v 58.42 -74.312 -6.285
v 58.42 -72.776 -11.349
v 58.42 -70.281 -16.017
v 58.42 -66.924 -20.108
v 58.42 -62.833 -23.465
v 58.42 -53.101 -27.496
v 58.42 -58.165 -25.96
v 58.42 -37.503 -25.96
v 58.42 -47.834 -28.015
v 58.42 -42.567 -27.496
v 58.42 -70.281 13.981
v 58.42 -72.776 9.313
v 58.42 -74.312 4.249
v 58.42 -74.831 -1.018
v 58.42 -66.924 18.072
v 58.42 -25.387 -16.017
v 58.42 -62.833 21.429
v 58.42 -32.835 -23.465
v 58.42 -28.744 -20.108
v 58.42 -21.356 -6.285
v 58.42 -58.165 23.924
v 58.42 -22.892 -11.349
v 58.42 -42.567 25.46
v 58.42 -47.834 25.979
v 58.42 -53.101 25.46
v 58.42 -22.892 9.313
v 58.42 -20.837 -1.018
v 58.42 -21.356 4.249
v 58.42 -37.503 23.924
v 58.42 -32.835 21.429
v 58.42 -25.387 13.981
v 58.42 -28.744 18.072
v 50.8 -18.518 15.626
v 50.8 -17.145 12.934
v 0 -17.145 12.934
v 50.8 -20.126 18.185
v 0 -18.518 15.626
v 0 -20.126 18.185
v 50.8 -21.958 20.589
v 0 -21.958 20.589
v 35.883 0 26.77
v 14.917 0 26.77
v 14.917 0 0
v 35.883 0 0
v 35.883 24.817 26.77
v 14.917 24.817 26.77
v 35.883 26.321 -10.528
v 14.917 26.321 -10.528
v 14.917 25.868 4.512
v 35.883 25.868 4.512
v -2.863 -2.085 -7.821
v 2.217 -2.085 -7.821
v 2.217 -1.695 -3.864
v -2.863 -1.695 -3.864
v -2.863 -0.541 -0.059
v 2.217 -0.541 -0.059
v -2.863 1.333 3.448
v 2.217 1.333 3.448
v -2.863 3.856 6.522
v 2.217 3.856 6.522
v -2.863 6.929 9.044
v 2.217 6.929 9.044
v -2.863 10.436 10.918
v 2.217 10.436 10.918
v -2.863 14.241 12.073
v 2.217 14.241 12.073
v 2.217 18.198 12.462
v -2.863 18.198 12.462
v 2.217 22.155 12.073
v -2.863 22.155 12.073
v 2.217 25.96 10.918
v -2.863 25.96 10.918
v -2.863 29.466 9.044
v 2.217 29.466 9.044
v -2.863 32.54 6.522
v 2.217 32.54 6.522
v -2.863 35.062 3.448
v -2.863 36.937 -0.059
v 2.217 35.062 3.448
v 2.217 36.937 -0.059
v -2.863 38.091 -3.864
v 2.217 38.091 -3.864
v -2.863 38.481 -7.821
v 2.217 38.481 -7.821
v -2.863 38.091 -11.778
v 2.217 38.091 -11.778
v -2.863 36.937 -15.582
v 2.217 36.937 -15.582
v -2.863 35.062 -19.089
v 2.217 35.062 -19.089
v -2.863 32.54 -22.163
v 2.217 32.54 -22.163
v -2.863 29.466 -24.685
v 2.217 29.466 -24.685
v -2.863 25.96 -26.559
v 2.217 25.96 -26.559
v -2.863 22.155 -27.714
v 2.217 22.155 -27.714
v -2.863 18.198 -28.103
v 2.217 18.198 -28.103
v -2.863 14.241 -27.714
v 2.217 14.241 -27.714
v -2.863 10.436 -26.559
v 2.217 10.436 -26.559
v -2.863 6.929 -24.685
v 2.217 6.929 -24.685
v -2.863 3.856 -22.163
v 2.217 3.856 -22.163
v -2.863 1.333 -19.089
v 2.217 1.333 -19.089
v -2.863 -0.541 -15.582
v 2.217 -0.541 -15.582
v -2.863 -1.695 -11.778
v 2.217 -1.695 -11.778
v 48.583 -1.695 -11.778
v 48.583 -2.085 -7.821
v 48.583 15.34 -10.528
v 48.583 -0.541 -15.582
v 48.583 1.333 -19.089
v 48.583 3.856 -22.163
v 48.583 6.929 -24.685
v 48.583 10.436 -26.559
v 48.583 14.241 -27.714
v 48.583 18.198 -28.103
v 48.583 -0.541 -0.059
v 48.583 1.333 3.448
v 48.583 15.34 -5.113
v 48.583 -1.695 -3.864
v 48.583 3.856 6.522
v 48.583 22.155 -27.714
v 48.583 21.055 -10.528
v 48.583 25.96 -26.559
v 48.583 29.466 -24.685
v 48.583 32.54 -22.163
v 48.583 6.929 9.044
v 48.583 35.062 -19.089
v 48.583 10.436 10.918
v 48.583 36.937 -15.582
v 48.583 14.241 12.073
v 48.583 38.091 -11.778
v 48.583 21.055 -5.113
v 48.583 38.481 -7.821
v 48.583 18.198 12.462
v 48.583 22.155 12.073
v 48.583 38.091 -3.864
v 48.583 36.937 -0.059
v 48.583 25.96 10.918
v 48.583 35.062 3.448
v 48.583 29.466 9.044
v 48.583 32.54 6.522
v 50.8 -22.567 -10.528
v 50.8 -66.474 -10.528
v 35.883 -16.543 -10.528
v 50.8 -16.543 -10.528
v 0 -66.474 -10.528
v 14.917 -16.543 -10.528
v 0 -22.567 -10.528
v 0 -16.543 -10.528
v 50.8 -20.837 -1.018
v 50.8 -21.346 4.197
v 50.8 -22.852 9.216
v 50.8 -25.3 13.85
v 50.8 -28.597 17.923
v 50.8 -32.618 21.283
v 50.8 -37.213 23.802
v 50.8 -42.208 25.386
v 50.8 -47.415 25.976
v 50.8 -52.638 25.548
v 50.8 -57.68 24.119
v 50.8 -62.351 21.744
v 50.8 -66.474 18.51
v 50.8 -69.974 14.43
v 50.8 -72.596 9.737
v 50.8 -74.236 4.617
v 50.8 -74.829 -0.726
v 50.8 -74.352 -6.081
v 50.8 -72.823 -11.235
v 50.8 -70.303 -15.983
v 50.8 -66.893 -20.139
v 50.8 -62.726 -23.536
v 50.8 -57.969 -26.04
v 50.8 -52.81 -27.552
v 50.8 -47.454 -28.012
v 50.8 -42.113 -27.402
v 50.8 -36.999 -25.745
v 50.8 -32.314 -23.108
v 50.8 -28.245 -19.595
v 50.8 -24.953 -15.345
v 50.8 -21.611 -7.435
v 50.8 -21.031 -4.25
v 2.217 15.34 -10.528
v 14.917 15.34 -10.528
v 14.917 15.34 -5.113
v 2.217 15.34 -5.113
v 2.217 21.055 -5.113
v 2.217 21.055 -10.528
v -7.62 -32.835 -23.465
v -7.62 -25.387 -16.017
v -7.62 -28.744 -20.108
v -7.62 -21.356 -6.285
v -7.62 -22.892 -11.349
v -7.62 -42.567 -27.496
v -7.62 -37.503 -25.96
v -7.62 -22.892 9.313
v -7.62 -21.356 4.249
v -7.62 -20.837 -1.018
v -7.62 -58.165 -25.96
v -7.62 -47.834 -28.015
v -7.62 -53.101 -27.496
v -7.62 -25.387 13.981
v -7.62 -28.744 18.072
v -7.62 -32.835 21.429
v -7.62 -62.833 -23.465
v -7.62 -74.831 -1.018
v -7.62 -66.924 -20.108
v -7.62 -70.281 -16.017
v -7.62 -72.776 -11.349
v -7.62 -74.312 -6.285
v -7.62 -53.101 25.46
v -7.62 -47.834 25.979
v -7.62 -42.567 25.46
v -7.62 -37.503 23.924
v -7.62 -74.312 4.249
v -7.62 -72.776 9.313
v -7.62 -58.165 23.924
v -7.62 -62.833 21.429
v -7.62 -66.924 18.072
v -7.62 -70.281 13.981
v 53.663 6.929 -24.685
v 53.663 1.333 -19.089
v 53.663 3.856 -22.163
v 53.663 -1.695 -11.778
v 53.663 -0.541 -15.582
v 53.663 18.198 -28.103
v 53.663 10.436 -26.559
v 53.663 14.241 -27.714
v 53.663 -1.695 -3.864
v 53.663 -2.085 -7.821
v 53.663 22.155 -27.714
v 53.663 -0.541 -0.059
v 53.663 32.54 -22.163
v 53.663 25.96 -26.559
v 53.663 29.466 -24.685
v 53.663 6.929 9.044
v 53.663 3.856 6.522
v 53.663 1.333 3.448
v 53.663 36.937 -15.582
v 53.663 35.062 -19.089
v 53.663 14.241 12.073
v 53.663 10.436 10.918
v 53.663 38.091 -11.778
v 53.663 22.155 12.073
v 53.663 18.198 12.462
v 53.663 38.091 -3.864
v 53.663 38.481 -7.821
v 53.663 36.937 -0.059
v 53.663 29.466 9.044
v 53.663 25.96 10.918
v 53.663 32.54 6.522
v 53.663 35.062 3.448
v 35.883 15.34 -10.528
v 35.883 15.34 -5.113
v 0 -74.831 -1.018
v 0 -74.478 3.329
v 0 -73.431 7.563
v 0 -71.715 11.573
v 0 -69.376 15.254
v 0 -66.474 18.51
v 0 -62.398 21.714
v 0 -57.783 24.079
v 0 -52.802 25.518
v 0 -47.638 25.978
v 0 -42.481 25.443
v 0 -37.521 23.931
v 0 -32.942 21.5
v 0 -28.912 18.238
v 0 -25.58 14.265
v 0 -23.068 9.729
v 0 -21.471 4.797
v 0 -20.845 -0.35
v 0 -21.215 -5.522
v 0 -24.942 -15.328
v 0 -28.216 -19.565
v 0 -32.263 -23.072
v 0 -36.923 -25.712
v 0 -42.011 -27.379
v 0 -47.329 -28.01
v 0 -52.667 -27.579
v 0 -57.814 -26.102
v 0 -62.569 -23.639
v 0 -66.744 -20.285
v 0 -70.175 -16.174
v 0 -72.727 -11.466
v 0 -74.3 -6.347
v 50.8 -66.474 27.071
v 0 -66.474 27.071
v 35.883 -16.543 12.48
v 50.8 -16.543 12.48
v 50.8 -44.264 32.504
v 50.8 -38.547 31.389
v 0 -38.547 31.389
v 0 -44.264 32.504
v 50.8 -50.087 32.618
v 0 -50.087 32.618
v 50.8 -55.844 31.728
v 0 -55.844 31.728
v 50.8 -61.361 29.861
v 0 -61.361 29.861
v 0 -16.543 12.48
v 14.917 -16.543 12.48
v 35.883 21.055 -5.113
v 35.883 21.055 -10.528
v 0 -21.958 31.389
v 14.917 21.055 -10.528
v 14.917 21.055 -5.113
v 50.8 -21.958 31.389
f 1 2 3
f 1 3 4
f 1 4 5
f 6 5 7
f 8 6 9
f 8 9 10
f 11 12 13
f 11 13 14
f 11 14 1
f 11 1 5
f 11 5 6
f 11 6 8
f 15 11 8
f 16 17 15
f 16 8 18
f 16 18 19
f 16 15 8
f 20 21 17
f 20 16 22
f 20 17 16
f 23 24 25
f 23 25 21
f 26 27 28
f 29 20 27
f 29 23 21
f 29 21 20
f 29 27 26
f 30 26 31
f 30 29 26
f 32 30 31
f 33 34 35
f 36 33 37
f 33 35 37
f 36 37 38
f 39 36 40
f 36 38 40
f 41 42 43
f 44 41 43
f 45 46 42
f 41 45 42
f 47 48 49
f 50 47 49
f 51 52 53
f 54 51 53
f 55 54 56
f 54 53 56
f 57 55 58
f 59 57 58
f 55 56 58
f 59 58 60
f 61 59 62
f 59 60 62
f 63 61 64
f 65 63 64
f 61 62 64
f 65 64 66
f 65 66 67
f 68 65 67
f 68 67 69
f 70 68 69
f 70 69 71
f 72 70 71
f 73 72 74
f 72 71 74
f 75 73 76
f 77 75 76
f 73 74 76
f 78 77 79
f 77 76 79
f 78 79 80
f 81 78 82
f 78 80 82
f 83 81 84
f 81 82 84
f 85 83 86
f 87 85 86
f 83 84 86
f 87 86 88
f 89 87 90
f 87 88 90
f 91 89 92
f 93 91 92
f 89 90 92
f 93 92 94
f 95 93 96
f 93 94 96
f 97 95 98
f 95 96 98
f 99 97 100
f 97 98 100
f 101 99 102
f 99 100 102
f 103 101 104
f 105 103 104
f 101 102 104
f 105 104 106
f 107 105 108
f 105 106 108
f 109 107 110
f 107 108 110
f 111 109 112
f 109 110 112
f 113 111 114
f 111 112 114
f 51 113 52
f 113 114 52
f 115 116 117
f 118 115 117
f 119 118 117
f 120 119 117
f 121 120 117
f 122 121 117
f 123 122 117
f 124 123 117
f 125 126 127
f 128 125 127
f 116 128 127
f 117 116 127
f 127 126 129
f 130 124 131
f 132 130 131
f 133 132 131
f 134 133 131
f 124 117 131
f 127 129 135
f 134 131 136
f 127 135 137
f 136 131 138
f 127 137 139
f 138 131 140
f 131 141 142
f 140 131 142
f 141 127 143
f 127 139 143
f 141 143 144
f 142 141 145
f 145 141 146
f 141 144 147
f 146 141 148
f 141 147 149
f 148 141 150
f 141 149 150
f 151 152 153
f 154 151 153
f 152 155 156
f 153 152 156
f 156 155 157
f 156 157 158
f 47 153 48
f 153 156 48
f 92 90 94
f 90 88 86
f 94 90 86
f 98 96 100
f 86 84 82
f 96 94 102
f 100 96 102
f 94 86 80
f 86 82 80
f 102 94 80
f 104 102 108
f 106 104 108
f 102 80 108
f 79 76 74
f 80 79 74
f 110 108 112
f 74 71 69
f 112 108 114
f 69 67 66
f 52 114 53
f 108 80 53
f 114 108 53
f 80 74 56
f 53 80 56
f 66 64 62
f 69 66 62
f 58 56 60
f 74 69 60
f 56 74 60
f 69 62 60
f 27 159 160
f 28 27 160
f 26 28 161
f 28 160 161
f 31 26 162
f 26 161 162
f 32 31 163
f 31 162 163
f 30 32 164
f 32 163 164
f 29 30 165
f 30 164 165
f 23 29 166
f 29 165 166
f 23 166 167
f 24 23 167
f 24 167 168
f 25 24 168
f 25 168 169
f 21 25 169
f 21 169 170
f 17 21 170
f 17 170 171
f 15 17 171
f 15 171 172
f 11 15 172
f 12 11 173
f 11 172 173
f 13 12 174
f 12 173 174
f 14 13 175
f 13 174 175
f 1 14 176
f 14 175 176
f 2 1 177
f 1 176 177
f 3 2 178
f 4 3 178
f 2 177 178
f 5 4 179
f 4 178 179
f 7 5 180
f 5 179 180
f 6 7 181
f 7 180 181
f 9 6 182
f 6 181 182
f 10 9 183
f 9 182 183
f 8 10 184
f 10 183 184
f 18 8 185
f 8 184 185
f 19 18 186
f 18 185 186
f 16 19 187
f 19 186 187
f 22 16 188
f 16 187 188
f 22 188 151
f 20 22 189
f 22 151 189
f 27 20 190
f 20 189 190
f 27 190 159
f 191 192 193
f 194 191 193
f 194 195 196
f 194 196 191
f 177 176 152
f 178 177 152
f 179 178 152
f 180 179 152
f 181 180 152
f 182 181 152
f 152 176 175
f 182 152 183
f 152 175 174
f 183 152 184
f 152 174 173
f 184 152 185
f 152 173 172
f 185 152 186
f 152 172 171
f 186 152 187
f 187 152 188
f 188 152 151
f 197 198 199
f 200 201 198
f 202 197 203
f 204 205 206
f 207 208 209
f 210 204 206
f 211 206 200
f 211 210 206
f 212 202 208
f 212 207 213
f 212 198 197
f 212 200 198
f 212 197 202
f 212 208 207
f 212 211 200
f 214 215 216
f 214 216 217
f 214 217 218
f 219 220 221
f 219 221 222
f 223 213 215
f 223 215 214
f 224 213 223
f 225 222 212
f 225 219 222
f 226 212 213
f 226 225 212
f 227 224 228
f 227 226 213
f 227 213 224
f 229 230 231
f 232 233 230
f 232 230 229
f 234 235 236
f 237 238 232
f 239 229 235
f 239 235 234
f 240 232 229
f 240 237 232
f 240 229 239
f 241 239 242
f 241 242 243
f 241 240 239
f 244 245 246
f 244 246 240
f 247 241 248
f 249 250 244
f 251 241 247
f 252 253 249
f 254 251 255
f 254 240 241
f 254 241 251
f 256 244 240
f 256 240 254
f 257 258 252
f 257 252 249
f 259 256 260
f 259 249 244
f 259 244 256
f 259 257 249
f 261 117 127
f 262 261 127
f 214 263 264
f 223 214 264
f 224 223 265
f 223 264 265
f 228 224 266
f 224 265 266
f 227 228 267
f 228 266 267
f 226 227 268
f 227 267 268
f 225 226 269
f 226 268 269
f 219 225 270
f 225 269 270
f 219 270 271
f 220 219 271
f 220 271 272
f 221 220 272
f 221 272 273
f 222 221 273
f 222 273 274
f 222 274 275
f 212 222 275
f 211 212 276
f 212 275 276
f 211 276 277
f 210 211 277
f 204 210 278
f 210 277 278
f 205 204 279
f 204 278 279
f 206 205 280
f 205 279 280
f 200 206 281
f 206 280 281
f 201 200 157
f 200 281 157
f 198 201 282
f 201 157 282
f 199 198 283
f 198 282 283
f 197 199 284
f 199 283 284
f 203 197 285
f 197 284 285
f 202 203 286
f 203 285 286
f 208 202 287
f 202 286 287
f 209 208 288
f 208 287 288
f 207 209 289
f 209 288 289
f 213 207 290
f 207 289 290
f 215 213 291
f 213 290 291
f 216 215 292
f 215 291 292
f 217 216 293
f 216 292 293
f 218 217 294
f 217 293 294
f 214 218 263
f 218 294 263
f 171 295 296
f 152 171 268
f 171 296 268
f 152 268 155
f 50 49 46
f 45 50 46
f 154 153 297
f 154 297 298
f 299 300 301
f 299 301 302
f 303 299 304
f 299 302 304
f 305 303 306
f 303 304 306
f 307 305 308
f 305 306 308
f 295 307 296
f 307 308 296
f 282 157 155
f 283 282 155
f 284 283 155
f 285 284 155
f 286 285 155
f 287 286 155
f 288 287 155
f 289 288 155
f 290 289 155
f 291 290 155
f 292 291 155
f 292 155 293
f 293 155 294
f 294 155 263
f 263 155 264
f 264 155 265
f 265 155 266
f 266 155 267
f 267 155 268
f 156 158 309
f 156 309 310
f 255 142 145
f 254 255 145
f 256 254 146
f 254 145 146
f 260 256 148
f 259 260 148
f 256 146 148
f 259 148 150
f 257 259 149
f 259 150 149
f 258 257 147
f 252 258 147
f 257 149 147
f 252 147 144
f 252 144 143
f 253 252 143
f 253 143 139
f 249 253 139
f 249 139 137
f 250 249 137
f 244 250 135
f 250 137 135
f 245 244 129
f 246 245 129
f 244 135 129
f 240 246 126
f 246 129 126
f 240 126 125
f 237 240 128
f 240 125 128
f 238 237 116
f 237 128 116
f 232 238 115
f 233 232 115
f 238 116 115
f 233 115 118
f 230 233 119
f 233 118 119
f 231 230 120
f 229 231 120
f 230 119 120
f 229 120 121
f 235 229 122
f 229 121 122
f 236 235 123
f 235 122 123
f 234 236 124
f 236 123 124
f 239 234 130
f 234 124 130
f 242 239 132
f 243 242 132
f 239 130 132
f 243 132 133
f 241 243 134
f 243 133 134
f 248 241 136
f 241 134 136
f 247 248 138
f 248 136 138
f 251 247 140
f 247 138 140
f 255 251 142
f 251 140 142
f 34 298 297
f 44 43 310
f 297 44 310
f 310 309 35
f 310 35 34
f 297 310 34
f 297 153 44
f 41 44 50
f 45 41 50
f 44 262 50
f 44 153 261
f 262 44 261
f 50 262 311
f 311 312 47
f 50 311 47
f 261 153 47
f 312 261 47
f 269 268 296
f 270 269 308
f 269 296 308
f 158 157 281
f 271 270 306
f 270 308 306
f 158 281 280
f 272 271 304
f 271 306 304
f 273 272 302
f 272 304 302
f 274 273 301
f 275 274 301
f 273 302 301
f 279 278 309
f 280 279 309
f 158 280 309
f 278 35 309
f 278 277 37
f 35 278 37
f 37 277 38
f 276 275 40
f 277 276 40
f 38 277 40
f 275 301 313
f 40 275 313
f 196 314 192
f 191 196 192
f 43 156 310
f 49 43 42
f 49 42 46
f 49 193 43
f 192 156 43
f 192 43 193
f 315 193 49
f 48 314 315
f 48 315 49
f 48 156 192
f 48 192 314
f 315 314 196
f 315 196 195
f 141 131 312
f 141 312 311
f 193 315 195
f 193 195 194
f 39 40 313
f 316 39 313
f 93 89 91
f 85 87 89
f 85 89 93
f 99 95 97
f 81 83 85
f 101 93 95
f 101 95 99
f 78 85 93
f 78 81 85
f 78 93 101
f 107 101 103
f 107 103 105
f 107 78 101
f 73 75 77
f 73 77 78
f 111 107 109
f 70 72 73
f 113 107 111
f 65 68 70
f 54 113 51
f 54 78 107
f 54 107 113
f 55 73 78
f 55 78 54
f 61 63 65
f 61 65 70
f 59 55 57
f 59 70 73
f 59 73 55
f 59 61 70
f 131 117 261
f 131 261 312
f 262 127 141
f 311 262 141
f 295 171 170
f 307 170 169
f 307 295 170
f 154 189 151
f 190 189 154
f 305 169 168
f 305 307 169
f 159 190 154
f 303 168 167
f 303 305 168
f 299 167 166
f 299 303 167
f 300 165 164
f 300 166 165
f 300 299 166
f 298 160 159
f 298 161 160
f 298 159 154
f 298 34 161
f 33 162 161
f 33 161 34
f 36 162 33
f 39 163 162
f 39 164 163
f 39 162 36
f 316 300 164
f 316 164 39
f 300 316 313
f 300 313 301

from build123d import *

# Parameters (mm, degrees)
F1_DEPTH  = 50.8
F2_W      = 14.917284
F2_H      = 53.841317
F3_DEPTH  = 32.694496
F4_DEPTH  = 10.528632
F5_R      = 26.996845
F6_DEPTH  = 7.62
F7_R      = 26.996845
F8_DEPTH  = 7.62
F9_W      = 5.714999
F9_H      = 5.414211
F10_DEPTH = 12.7
F11_W     = 5.714999
F11_H     = 5.414211
F12_DEPTH = 12.7
F13_R     = 20.282811
F14_DEPTH = 5.08
F15_R     = 20.282811
F16_DEPTH = 5.08


with BuildPart() as f1:
    # F0 (on Right) → F1 (new body)
    with BuildSketch(Plane.YZ):
        with BuildLine():
            Line((0, 0), (-17.145, 12.933947))
            ThreePointArc((-17.145, 12.933947), (-19.293466, 16.923817), (-21.957632, 20.589493))
            Line((-21.957632, 20.589493), (-21.957632, 31.388942))
            Line((-21.957632, 31.388942), (-38.54655, 31.388942))
            ThreePointArc((-38.54655, 31.388942), (-52.984799, 32.297663), (-66.474475, 27.071053))
            Line((-66.474475, 27.071053), (-66.474475, -10.527632))
            Line((-66.474475, -10.527632), (26.320891, -10.527632))
            Line((26.320891, -10.527632), (25.867894, 4.511842))
            Line((25.867894, 4.511842), (24.816945, 26.770264))
            Line((24.816945, 26.770264), (0, 26.770264))
            Line((0, 26.770264), (0, 0))
        make_face()
    extrude(amount=F1_DEPTH)

    # F2 (on Top) → F3 (cut, through all)
    with BuildSketch(Plane.XY):
        with Locations((7.458642, 10.377236)):
            Rectangle(F2_W, F2_H)
        with Locations((43.341358, 10.377236)):
            Rectangle(F2_W, F2_H)
    extrude(amount=F3_DEPTH, mode=Mode.SUBTRACT)

    # F2 (on Top) → F4 (cut, through all)
    with BuildSketch(Plane.XY):
        with Locations((7.458642, 10.377236)):
            Rectangle(F2_W, F2_H)
        with Locations((43.341358, 10.377236)):
            Rectangle(F2_W, F2_H)
    extrude(amount=-F4_DEPTH, mode=Mode.SUBTRACT)

    # F5 (on face) → F6 (join)
    with BuildSketch(Plane.YZ.offset(50.8)):
        with Locations((-47.833916, -1.018035)):
            Circle(F5_R)
    extrude(amount=F6_DEPTH)

    # F7 (on face) → F8 (join)
    with BuildSketch(Plane(origin=(0, 0, 0), x_dir=(0, -1, 0), z_dir=(-1, 0, 0))):
        with Locations((47.833916, -1.018035)):
            Circle(F7_R)
    extrude(amount=F8_DEPTH)

    # F9 (on face) → F10 (join)
    with BuildSketch(Plane.YZ.offset(35.882716)):
        with Locations((18.197764, -7.820526)):
            Rectangle(F9_W, F9_H)
    extrude(amount=F10_DEPTH)

    # F11 (on face) → F12 (join)
    with BuildSketch(Plane(origin=(14.917284, 0, 0), x_dir=(0, -1, 0), z_dir=(-1, 0, 0))):
        with Locations((-18.197764, -7.820526)):
            Rectangle(F11_W, F11_H)
    extrude(amount=F12_DEPTH)

    # F15 (on face) → F16 (join)
    with BuildSketch(Plane.YZ.offset(48.582716)):
        with Locations((18.197765, -7.820527)):
            Circle(F15_R)
    extrude(amount=F16_DEPTH)


with BuildPart() as f14:
    # F13 (on face) → F14 (new body)
    with BuildSketch(Plane(origin=(2.217284, 0, 0), x_dir=(0, -1, 0), z_dir=(-1, 0, 0))):
        with Locations((-18.197765, -7.820527)):
            Circle(F13_R)
    extrude(amount=F14_DEPTH)


solid = Compound([f1.part, f14.part])
